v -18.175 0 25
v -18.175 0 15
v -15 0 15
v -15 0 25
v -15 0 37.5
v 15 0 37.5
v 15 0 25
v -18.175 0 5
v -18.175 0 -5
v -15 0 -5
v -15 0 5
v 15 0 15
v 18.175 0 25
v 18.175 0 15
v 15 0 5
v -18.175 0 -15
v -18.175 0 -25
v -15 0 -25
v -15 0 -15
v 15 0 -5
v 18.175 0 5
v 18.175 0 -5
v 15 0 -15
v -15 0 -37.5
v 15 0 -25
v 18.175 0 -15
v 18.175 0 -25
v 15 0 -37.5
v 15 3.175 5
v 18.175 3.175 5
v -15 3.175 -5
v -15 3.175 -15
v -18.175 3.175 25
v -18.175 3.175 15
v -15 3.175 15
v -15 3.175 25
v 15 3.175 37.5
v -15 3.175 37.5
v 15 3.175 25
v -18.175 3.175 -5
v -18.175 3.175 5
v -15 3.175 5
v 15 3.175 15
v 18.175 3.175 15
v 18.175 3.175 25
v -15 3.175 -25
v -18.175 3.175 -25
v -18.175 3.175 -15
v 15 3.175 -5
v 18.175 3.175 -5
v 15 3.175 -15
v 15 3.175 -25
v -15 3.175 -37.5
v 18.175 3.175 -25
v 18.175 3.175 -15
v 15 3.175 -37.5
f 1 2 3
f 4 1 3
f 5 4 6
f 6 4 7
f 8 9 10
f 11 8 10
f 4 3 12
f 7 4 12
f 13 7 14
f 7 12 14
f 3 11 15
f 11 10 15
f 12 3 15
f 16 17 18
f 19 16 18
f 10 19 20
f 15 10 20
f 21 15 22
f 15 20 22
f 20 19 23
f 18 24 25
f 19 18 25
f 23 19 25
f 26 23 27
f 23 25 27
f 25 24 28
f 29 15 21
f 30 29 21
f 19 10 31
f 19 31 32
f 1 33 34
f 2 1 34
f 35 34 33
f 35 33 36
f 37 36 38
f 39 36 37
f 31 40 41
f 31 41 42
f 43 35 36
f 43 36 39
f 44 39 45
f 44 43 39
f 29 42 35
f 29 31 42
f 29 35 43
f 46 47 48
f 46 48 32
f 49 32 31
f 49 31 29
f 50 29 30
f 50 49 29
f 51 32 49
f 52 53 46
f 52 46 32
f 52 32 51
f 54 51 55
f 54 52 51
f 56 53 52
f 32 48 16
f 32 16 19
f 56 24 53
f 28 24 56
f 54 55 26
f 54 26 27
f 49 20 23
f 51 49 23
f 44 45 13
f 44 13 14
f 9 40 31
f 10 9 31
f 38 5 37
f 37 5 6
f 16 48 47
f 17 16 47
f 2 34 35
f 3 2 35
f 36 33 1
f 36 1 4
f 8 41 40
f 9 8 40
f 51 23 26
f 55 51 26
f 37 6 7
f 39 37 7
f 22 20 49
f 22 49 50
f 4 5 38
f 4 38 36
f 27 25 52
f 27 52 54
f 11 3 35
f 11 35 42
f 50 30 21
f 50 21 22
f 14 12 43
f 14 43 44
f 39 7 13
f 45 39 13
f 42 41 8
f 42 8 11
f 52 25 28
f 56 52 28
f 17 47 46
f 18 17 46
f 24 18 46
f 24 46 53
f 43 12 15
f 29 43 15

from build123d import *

# Parameters (mm, degrees)
SKETCH1_W           = 30
SKETCH1_H           = 75
BOSS_EXTRUDE1_DEPTH = 3.175
SKETCH2_W           = 3.175
SKETCH2_H           = 10
BOSS_EXTRUDE2_DEPTH = 3.175


with BuildPart() as part:
    # Sketch1 → Boss-Extrude1 (new body)
    with BuildSketch(Plane(origin=(0, 0, 0), x_dir=(1, 0, 0), z_dir=(0, 1, 0))):
        Rectangle(SKETCH1_W, SKETCH1_H)
    extrude(amount=BOSS_EXTRUDE1_DEPTH)

    # Sketch2 → Boss-Extrude2 (add)
    with BuildSketch(Plane(origin=(0, 3.175, 0), x_dir=(1, 0, 0), z_dir=(0, 1, 0))):
        with Locations((-16.5875, 0)):
            Rectangle(SKETCH2_W, SKETCH2_H)
        with Locations((-16.5875, -20)):
            Rectangle(SKETCH2_W, SKETCH2_H)
        with Locations((-16.5875, 20)):
            Rectangle(SKETCH2_W, SKETCH2_H)
        with Locations((16.5875, -20)):
            Rectangle(SKETCH2_W, SKETCH2_H)
        with Locations((16.5875, 0)):
            Rectangle(SKETCH2_W, SKETCH2_H)
        with Locations((16.5875, 20)):
            Rectangle(SKETCH2_W, SKETCH2_H)
    extrude(amount=-BOSS_EXTRUDE2_DEPTH)


solid = part.part
